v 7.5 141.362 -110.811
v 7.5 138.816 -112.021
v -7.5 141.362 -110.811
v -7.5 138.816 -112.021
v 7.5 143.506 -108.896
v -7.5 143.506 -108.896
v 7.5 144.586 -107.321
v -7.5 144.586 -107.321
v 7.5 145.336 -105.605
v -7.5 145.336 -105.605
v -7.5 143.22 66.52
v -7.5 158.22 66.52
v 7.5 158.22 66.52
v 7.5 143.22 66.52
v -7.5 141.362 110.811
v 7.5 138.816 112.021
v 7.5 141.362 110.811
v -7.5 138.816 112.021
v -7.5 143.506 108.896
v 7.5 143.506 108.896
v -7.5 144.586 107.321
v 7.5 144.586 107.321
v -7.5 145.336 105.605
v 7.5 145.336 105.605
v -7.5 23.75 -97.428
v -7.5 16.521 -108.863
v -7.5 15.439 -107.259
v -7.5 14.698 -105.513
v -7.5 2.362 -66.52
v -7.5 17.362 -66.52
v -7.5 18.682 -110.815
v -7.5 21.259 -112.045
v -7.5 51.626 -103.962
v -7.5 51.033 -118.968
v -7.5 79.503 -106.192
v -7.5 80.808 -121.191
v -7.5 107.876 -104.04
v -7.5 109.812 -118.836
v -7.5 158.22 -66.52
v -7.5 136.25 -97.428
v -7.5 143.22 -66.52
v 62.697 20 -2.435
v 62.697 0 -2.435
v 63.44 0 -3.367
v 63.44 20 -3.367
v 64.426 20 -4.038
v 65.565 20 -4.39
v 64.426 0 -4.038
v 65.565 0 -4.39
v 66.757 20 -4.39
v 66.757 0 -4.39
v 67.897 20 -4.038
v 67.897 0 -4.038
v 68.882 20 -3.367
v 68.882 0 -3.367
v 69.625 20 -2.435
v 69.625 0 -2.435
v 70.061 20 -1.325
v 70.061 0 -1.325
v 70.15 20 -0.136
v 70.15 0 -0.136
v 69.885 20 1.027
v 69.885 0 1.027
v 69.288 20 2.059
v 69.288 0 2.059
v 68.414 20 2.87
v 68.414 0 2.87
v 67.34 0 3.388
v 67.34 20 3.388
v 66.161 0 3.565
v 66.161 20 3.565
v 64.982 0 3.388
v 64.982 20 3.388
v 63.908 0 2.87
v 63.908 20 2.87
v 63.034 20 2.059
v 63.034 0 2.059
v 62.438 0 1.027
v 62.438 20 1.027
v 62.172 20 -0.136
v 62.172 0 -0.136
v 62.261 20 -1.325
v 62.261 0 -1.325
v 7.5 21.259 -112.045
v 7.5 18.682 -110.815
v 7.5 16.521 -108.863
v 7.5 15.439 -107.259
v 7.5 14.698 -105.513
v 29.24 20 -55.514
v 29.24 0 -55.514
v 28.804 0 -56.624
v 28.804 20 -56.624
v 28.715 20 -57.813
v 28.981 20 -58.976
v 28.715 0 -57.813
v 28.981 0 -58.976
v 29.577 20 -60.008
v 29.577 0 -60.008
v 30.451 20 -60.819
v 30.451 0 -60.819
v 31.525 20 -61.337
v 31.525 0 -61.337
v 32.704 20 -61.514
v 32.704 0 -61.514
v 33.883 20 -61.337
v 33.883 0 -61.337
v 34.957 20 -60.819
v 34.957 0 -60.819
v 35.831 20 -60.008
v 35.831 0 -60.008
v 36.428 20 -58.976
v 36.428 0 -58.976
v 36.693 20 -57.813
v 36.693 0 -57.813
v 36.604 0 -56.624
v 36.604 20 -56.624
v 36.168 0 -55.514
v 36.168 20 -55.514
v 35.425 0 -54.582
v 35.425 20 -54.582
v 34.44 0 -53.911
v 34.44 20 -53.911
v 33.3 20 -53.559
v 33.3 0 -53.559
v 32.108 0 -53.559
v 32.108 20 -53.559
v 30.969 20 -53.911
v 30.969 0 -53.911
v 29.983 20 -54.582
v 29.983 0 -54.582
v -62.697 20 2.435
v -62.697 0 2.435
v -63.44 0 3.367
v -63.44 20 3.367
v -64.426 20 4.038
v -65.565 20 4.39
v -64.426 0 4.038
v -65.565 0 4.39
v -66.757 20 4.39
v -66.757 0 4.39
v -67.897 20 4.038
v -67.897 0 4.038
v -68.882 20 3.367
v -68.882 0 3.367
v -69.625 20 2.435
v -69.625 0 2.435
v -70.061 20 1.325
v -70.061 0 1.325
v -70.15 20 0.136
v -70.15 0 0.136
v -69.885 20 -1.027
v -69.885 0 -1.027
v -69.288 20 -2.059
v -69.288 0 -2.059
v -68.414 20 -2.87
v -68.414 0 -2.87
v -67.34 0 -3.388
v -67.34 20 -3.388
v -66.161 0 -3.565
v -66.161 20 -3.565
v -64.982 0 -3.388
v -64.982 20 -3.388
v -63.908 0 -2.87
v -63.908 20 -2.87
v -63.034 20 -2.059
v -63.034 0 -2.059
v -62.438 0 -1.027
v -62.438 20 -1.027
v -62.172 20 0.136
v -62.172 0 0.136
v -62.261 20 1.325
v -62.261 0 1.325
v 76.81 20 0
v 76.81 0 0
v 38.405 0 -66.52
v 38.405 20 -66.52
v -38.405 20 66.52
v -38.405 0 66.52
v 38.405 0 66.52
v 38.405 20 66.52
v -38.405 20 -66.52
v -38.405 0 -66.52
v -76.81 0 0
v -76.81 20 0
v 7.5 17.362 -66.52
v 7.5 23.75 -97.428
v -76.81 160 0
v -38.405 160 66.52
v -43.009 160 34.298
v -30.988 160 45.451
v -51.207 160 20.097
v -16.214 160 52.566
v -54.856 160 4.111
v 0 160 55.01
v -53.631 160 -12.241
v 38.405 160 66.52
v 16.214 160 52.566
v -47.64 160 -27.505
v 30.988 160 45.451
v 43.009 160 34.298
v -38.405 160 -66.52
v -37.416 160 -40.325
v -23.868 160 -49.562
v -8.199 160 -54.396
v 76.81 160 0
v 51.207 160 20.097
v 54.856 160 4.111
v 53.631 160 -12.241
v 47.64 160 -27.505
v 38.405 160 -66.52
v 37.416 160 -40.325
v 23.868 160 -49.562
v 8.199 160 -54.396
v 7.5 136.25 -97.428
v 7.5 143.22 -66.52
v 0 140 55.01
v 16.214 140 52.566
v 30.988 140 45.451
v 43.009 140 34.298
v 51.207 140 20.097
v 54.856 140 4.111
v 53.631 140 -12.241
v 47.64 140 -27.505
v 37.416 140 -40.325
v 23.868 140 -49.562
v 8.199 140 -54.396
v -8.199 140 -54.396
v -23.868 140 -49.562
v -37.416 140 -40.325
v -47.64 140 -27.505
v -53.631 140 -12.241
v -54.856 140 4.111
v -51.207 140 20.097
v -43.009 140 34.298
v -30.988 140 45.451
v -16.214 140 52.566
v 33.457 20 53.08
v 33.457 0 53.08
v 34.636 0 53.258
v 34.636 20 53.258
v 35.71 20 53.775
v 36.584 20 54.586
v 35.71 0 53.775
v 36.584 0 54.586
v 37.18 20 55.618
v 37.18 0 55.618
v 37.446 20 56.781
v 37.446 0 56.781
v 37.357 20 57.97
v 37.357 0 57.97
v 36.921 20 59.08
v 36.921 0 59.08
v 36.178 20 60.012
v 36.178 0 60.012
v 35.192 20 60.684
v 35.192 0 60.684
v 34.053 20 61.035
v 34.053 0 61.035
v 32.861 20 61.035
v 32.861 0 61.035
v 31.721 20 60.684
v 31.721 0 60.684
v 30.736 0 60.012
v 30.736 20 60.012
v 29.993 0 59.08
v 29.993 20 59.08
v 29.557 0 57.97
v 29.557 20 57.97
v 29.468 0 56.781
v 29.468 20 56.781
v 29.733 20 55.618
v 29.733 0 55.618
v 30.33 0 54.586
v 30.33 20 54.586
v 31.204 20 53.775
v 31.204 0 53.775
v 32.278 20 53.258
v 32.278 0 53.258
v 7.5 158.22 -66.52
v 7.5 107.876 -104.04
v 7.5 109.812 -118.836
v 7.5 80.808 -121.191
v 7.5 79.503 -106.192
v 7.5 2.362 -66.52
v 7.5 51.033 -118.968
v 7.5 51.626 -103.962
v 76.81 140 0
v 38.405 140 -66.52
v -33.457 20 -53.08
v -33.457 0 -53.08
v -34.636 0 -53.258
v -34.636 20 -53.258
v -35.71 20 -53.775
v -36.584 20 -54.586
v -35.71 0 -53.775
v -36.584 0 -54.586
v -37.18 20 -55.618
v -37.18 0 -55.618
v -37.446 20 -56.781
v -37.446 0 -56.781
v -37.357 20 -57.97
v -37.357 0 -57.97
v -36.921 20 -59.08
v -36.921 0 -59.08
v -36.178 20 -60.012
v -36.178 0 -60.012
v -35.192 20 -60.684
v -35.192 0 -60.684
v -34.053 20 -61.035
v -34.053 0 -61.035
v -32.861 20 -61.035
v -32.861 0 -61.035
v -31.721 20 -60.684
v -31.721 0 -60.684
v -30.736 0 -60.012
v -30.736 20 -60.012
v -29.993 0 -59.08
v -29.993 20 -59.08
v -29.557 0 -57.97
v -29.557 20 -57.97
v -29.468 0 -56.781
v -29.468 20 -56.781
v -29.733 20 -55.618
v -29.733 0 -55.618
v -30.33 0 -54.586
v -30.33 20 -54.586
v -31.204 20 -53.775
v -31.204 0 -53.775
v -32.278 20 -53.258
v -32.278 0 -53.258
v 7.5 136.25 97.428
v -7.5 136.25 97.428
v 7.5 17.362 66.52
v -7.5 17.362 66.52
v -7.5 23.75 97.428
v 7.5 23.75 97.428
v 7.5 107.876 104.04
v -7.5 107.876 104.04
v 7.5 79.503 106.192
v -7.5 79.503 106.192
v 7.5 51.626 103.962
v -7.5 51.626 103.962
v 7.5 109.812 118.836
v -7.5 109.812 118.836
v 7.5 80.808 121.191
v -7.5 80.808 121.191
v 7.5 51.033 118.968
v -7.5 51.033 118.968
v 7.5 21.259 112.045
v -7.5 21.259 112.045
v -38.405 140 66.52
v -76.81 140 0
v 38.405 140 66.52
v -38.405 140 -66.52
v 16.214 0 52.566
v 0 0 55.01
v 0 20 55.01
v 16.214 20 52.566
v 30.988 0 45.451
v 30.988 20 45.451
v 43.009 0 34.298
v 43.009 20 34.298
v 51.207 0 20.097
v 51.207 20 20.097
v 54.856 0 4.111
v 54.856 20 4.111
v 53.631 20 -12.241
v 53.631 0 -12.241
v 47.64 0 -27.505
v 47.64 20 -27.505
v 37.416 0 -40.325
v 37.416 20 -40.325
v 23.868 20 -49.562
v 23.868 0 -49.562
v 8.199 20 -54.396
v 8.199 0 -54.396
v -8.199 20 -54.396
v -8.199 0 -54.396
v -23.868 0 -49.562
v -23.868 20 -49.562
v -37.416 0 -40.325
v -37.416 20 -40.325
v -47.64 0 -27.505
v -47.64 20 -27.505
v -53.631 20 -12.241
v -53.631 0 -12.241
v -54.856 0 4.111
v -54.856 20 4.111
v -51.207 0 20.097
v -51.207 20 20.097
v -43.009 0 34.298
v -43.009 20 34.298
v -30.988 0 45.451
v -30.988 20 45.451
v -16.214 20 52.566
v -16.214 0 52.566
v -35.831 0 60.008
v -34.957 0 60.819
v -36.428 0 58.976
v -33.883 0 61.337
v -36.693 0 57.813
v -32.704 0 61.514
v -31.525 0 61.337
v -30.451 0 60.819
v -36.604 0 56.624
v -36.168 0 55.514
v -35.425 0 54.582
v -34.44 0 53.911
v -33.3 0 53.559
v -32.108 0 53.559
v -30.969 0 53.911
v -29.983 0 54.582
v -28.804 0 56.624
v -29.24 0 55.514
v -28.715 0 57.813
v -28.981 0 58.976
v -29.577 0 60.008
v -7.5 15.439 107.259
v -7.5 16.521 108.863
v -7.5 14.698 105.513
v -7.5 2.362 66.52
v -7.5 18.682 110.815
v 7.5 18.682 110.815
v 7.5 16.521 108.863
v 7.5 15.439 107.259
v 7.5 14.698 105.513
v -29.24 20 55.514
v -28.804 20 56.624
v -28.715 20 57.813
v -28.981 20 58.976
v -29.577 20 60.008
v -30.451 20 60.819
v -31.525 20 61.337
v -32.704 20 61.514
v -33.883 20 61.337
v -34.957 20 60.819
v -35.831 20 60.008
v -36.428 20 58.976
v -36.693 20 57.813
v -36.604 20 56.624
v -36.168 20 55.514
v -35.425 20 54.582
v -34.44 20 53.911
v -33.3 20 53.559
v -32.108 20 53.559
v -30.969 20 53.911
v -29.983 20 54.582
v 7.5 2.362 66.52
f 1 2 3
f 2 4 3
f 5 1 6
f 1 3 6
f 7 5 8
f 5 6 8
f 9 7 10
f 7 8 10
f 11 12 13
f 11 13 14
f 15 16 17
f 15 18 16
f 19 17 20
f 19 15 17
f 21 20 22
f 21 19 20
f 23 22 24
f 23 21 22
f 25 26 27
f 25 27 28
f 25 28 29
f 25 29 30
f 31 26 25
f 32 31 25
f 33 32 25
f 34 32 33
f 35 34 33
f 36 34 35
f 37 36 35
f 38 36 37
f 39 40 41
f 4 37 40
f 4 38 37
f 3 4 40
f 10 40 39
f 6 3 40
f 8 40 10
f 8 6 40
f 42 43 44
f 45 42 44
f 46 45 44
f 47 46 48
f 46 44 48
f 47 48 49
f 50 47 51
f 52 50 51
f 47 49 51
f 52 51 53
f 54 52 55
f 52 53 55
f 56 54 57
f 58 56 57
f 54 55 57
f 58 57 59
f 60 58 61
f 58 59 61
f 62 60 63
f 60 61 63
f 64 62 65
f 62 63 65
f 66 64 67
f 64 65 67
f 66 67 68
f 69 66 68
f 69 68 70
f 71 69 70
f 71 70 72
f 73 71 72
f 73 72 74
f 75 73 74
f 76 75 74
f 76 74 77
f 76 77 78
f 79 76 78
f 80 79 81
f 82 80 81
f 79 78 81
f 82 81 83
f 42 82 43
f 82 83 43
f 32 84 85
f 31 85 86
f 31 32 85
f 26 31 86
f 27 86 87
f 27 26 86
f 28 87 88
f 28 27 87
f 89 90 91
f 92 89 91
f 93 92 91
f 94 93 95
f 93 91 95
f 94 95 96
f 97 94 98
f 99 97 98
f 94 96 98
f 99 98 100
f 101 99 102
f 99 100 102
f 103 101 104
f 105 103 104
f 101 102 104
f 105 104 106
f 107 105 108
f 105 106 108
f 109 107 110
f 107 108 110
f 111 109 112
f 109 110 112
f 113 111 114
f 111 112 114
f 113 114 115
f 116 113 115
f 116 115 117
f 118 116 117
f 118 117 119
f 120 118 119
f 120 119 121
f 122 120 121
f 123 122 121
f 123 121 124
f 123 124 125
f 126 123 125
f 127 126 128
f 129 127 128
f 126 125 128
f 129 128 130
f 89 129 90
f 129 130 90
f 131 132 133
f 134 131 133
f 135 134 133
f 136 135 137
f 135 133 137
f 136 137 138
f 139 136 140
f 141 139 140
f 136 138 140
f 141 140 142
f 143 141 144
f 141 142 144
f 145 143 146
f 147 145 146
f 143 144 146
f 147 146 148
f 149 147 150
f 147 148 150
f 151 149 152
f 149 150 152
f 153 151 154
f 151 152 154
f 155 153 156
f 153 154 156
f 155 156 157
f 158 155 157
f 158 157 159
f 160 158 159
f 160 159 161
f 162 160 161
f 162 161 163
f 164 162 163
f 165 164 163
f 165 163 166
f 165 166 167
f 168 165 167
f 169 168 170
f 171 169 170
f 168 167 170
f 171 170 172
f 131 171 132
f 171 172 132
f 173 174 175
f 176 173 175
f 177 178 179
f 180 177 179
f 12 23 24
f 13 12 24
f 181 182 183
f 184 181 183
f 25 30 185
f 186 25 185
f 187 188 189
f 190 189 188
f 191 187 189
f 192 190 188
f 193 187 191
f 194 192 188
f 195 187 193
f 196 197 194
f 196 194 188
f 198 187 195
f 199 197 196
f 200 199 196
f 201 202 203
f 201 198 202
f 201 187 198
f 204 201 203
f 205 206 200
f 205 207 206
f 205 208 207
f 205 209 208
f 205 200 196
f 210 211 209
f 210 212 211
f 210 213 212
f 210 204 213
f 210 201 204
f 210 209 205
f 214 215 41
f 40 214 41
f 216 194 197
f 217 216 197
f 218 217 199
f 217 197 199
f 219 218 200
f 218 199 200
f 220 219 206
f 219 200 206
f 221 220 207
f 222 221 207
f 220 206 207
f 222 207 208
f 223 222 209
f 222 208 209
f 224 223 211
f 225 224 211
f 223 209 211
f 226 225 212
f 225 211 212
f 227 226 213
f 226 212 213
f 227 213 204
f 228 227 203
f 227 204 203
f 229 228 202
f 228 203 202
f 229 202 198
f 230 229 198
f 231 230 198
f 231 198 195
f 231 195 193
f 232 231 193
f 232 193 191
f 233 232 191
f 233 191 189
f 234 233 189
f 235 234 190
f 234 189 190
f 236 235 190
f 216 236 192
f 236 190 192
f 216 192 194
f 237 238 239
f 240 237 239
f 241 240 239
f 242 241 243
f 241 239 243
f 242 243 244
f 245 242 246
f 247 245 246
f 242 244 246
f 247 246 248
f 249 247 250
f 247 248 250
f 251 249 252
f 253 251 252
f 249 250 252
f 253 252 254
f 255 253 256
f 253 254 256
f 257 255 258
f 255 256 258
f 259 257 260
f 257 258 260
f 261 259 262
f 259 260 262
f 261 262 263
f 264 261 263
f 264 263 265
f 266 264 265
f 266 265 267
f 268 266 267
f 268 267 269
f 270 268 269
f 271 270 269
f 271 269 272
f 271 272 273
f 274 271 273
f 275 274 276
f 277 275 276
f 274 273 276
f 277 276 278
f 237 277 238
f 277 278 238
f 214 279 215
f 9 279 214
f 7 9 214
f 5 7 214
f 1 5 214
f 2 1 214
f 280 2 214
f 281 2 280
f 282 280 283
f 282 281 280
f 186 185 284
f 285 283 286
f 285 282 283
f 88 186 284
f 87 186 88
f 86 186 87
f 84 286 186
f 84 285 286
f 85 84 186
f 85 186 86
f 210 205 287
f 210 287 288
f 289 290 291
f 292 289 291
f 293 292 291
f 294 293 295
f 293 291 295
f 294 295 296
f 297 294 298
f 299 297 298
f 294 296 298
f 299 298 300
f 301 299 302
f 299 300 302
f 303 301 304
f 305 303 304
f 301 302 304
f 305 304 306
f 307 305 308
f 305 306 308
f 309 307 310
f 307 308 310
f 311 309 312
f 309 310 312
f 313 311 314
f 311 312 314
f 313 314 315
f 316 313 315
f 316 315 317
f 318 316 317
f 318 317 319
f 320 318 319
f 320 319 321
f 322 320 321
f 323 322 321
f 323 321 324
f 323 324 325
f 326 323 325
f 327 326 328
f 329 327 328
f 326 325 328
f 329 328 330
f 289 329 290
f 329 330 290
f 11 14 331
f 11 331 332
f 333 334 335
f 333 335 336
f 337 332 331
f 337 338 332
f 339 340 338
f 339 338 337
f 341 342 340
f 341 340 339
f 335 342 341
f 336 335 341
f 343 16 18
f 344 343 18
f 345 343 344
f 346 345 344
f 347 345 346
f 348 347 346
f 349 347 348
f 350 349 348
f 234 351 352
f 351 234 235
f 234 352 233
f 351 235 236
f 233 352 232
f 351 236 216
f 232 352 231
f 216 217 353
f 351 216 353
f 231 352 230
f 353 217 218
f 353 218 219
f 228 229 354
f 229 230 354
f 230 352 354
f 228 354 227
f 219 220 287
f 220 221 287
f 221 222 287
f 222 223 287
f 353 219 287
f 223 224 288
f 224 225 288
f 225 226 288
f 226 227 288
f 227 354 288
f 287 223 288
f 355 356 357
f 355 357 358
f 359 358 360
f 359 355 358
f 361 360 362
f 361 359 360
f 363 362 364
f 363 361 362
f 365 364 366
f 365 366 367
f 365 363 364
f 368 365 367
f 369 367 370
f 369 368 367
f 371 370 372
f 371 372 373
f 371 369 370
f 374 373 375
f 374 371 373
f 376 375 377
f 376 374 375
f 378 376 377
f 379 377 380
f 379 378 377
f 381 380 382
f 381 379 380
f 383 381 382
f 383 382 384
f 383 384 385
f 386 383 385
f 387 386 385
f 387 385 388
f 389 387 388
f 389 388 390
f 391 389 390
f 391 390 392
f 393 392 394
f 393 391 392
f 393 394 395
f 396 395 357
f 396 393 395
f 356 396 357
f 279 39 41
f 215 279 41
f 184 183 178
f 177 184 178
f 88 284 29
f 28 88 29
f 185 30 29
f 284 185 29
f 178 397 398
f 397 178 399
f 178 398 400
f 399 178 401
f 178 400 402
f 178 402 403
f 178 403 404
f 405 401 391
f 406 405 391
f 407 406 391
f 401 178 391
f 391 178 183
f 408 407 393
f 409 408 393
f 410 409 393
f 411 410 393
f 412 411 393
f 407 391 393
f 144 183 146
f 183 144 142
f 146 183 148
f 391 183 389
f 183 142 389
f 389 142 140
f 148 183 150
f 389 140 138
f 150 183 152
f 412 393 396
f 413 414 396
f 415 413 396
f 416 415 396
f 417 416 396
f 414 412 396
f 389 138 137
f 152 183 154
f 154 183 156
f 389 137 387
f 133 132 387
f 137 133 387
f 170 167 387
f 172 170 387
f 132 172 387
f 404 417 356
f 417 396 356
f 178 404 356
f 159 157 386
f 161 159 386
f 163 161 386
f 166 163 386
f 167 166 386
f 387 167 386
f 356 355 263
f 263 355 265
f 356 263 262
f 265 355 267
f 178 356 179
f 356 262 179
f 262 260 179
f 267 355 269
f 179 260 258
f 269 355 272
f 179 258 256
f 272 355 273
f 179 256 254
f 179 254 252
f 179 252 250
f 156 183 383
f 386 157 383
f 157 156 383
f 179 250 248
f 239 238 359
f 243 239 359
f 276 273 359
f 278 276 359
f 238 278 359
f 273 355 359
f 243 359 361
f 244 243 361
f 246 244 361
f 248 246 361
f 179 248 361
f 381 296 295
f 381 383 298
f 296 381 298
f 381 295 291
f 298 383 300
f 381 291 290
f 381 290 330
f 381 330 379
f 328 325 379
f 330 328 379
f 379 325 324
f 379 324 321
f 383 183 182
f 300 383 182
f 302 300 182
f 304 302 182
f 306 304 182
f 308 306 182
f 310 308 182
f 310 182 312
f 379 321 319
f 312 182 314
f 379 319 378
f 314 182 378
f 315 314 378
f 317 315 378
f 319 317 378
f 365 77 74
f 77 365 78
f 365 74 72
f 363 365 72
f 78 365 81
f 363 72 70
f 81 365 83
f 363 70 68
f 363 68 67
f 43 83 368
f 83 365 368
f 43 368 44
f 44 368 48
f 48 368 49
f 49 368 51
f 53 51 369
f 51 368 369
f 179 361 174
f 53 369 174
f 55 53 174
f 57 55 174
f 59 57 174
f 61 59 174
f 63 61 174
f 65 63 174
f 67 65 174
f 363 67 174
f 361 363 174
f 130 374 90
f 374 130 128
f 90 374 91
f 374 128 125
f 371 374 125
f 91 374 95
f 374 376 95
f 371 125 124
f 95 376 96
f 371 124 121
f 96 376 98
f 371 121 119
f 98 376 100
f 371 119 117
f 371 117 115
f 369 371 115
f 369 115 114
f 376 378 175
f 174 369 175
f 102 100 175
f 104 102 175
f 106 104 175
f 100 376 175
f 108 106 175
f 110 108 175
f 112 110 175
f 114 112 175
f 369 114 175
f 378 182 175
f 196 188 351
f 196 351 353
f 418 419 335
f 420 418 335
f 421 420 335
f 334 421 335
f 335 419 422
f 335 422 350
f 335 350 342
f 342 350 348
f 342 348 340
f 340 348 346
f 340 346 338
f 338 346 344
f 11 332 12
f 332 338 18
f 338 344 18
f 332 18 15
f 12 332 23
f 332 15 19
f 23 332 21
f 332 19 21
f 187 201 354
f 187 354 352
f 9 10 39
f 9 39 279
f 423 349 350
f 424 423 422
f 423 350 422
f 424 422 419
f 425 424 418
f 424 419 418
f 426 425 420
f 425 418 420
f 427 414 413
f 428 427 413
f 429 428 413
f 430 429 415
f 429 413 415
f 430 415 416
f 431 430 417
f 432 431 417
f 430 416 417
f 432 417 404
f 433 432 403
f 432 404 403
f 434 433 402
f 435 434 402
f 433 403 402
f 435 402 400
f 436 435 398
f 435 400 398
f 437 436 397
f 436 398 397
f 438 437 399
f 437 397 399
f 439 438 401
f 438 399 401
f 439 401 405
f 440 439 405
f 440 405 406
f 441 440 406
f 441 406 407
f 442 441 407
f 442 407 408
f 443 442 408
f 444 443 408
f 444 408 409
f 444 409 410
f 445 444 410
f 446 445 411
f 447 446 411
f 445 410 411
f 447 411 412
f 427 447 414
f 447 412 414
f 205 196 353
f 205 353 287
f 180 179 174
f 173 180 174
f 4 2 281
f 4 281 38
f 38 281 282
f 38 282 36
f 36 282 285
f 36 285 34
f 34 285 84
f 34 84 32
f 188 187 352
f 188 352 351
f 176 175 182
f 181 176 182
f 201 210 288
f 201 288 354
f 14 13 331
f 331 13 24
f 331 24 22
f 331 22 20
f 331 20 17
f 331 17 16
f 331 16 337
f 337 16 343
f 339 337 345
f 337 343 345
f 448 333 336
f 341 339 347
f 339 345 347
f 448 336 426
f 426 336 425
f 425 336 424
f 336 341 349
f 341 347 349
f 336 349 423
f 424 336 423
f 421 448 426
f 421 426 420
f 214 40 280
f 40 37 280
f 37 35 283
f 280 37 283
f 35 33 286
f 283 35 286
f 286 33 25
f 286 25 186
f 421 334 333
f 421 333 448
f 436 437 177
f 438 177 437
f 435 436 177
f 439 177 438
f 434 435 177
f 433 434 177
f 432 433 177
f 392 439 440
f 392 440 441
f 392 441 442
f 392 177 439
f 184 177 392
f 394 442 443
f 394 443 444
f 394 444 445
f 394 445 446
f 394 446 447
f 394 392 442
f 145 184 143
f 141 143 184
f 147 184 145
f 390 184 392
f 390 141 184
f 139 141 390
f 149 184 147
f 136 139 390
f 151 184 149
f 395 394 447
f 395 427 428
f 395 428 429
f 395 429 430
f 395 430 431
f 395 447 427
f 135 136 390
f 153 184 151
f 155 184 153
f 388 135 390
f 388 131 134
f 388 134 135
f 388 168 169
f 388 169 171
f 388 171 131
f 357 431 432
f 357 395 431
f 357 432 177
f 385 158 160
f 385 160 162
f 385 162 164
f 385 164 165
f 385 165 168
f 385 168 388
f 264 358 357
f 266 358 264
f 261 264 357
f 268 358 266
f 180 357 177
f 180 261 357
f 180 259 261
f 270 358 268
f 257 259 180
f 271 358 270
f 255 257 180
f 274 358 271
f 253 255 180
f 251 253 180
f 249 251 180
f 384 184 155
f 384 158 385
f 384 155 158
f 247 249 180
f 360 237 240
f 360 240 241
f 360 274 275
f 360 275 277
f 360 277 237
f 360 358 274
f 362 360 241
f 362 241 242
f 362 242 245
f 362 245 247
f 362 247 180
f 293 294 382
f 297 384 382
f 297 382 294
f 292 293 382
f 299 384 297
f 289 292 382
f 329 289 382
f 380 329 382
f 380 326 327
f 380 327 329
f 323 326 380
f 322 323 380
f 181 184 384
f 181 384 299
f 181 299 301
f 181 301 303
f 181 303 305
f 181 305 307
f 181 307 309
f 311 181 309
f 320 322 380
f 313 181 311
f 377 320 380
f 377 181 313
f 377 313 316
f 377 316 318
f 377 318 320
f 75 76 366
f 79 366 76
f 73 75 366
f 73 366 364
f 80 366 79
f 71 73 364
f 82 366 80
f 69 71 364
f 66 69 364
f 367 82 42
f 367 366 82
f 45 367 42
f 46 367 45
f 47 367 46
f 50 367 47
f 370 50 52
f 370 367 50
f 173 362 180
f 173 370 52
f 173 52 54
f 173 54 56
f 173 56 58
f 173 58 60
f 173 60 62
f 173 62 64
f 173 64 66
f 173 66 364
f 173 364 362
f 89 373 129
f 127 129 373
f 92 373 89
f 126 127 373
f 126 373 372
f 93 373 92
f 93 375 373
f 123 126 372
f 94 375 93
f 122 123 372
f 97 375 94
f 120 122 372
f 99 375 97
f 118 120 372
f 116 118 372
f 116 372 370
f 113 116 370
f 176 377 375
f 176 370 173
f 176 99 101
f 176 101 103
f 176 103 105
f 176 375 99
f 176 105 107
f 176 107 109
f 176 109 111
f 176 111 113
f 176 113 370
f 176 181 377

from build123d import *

# Parameters (mm, degrees)
SKETCH_1_R               = 55.01
EXTRUDE_1_DEPTH          = 20
FILLET_2_R               = 10
FILLET_3_R               = 10
SKETCH_19_R              = 4
CUT_EXTRUDE_2_DEPTH      = 20
PATTERN_CIRCULAR_2_COUNT = 6


with BuildPart() as part:
    # 草图1 → 凸台-拉伸1 (new body)
    with BuildSketch(Plane(origin=(0, 0, 0), x_dir=(1, 0, 0), z_dir=(0, 1, 0))):
        Polygon((76.810292696, 0), (38.405146348, 66.519664747), (-38.405146348, 66.519664747), (-76.810292696, 0), (-38.405146348, -66.519664747), (38.405146348, -66.519664747), align=None)
        with Locations(Location((0, 0, 0), (0, 0, 270))):
            Circle(SKETCH_1_R, mode=Mode.SUBTRACT)
    extrude(amount=EXTRUDE_1_DEPTH)


with BuildPart() as body_2:
    # 镜向5: mirrored copy
    add(part.part.mirror(Plane.ZX.offset(80)))


with BuildPart() as body_3:
    # 草图9 → 放样1 section 0
    with BuildSketch(Plane(origin=(0, 60, -34.641016151), x_dir=(0, 0.4999999999999954, 0.8660254037844413), z_dir=(0, 0.8660254037844413, -0.4999999999999954))):
        with BuildLine():
            Line((152.5, 7.5), (167.5, 7.5))
            Line((167.5, 7.5), (167.5, -7.5))
            Line((167.5, -7.5), (152.5, -7.5))
            Line((152.5, -7.5), (152.5, 7.5))
        make_face()
    # 草图11 → 放样1 section 1
    with BuildSketch(Plane(origin=(0, 80, 0), x_dir=(1, 0, 0), z_dir=(0, 1, 0))):
        with BuildLine():
            Line((-7.5, -106.192314052), (7.5, -106.192314052))
            Line((7.5, -106.192314052), (7.5, -121.192314052))
            Line((7.5, -121.192314052), (-7.5, -121.192314052))
            Line((-7.5, -121.192314052), (-7.5, -106.192314052))
        make_face()
    # 草图10 → 放样1 section 2
    with BuildSketch(Plane(origin=(0, 60, 34.641016151), x_dir=(0, -0.4999999999999958, 0.8660254037844412), z_dir=(0, 0.866025403784441, 0.4999999999999957))):
        with BuildLine():
            Line((72.5, 7.5), (87.5, 7.5))
            Line((87.5, 7.5), (87.5, -7.5))
            Line((87.5, -7.5), (72.5, -7.5))
            Line((72.5, -7.5), (72.5, 7.5))
        make_face()
    loft()

    # 草图16 → section 0 of loft_3
    with BuildSketch(Plane.XY.offset(66.52), mode=Mode.PRIVATE) as loft_3_s0:
        with BuildLine():
            Line((-7.5, 158.220398546), (7.5, 158.220398546))
            Line((7.5, 158.220398546), (7.5, 143.220398546))
            Line((7.5, 143.220398546), (-7.5, 143.220398546))
            Line((-7.5, 143.220398546), (-7.5, 158.220398546))
        make_face()
    # loft up to a face of the part (loft_3)
    loft([loft_3_s0.sketch, body_3.faces().sort_by_distance((0, 140, 103.923048454))[0]])

    # 草图18 → section 0 of loft_6
    with BuildSketch(Plane.XY.offset(66.52), mode=Mode.PRIVATE) as loft_6_s0:
        with BuildLine():
            Line((-7.5, 17.362272827), (7.5, 17.362272827))
            Line((7.5, 17.362272827), (7.5, 2.362272827))
            Line((7.5, 2.362272827), (-7.5, 2.362272827))
            Line((-7.5, 2.362272827), (-7.5, 17.362272827))
        make_face()
    # loft up to a face of the part (loft_6)
    loft([loft_6_s0.sketch, body_3.faces().sort_by_distance((0, 20, 103.923048454))[0]])

    # 圆角2
    fillet_2_edges = [body_3.edges().sort_by_distance(p)[0] for p in [
        (0, 143.75, 110.418238983),
    ]]
    fillet(fillet_2_edges, radius=FILLET_2_R)

    # 圆角3
    fillet_3_edges = [body_3.edges().sort_by_distance(p)[0] for p in [
        (0, 16.25, 110.418238983),
    ]]
    fillet(fillet_3_edges, radius=FILLET_3_R)


with BuildPart() as body_4:
    # 镜向6: mirrored copy
    add(body_3.part.mirror(Plane.XY))


with BuildPart() as part_1:
    add(part.part)

    # 草图19 → 切除-拉伸2 (cut)
    with BuildSketch(Plane.XZ):
        with Locations(Location((33.456884152, 57.079861104, 0), (0, 0, 270))):
            Circle(SKETCH_19_R)
    cut_extrude_2 = extrude(amount=-CUT_EXTRUDE_2_DEPTH, mode=Mode.SUBTRACT)

    # 阵列(圆周)2: 切除-拉伸2 ×6 about axis
    pattern_circular_2_axis = Axis((0, 0, 0), (0, 1, 0))
    for i in range(1, PATTERN_CIRCULAR_2_COUNT):
        add(cut_extrude_2.rotate(pattern_circular_2_axis, i * 360 / PATTERN_CIRCULAR_2_COUNT), mode=Mode.SUBTRACT)


solid = Compound([body_2.part, body_3.part, body_4.part, part_1.part])
